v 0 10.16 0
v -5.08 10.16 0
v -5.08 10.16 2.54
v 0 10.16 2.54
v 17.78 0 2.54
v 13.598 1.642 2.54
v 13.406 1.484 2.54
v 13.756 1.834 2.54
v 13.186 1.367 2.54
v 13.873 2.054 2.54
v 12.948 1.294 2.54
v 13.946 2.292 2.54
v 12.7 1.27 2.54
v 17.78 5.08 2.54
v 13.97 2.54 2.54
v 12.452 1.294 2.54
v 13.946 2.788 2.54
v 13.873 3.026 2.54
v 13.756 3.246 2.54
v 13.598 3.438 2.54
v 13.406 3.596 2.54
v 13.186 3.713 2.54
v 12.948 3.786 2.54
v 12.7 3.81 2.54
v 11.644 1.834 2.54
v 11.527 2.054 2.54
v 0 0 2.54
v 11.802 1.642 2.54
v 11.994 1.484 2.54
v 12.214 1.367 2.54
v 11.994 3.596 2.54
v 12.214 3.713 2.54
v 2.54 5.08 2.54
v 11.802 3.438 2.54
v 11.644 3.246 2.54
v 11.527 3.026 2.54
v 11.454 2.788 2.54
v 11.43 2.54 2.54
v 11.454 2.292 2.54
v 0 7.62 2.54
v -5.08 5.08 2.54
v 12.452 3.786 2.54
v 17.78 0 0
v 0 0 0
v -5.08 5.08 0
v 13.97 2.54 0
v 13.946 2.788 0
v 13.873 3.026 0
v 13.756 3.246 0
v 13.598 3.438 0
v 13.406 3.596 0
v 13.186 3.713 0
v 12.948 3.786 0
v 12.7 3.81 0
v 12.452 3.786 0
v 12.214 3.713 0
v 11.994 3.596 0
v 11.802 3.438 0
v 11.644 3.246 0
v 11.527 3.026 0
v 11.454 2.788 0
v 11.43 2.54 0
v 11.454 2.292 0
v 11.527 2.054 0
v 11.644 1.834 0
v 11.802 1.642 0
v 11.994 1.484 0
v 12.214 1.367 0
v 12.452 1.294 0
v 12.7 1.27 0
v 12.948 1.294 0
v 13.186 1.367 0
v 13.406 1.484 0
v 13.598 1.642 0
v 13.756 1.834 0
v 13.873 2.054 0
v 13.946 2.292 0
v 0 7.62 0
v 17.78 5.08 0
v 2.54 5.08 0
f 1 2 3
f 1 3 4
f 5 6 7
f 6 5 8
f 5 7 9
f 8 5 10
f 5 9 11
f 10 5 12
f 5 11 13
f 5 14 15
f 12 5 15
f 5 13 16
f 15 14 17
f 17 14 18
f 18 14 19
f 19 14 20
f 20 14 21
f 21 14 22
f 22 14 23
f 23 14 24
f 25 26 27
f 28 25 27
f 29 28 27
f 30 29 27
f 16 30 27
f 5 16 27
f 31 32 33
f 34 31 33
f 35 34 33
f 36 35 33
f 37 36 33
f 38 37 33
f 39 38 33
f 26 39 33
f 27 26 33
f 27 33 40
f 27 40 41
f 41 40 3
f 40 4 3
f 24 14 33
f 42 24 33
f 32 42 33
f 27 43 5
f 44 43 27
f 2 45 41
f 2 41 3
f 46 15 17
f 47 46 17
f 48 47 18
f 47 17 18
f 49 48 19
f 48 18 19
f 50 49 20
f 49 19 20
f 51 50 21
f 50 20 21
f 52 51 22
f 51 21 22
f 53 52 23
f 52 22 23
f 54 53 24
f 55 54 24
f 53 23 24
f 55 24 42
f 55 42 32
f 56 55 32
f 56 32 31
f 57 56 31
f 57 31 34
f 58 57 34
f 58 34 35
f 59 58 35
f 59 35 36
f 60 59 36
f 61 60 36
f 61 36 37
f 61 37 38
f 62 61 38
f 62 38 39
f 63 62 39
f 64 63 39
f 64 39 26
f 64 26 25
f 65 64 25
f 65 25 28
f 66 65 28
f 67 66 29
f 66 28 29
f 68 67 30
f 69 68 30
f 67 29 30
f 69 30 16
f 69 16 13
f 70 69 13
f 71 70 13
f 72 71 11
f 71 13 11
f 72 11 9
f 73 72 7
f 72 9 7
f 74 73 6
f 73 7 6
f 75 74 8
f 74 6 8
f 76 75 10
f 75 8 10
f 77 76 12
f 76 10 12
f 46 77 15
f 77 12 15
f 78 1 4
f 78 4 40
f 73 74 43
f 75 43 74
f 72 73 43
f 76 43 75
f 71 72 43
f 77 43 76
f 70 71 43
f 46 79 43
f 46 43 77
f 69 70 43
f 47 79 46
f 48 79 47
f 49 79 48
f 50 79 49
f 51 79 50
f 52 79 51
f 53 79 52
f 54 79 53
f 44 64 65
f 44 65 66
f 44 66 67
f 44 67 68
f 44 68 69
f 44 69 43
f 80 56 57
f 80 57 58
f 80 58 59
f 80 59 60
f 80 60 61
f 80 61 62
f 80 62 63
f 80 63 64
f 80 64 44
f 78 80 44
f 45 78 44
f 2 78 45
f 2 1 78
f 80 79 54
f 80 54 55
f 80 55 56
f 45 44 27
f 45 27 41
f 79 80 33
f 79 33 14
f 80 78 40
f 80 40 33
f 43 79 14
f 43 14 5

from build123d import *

# Parameters (mm, degrees)
BOSS_EXTRUDE1_DEPTH = 2.54
CUT_EXTRUDE1_REACH  = 4.54
SKETCH2_R           = 1.27


with BuildPart() as part:
    # Sketch1 → Boss-Extrude1 (new body)
    with BuildSketch(Plane.XY):
        Polygon((0, 0), (-5.08, 5.08), (-5.08, 10.16), (0, 10.16), (0, 7.62), (2.54, 5.08), (17.78, 5.08), (17.78, 0), align=None)
    extrude(amount=BOSS_EXTRUDE1_DEPTH)

    # Sketch2 → Cut-Extrude1 (cut, up to next)
    with BuildSketch(Plane.XY.offset(2.54), mode=Mode.PRIVATE) as cut_extrude1_sk1:
        with Locations((12.7, 2.54)):
            Circle(SKETCH2_R)
    cut_extrude1_tool1 = extrude(cut_extrude1_sk1.sketch, amount=-CUT_EXTRUDE1_REACH, mode=Mode.PRIVATE) & part.part
    add(cut_extrude1_tool1.solids().sort_by_distance((12.7, 2.54, 2.54))[0], mode=Mode.SUBTRACT)


solid = part.part
